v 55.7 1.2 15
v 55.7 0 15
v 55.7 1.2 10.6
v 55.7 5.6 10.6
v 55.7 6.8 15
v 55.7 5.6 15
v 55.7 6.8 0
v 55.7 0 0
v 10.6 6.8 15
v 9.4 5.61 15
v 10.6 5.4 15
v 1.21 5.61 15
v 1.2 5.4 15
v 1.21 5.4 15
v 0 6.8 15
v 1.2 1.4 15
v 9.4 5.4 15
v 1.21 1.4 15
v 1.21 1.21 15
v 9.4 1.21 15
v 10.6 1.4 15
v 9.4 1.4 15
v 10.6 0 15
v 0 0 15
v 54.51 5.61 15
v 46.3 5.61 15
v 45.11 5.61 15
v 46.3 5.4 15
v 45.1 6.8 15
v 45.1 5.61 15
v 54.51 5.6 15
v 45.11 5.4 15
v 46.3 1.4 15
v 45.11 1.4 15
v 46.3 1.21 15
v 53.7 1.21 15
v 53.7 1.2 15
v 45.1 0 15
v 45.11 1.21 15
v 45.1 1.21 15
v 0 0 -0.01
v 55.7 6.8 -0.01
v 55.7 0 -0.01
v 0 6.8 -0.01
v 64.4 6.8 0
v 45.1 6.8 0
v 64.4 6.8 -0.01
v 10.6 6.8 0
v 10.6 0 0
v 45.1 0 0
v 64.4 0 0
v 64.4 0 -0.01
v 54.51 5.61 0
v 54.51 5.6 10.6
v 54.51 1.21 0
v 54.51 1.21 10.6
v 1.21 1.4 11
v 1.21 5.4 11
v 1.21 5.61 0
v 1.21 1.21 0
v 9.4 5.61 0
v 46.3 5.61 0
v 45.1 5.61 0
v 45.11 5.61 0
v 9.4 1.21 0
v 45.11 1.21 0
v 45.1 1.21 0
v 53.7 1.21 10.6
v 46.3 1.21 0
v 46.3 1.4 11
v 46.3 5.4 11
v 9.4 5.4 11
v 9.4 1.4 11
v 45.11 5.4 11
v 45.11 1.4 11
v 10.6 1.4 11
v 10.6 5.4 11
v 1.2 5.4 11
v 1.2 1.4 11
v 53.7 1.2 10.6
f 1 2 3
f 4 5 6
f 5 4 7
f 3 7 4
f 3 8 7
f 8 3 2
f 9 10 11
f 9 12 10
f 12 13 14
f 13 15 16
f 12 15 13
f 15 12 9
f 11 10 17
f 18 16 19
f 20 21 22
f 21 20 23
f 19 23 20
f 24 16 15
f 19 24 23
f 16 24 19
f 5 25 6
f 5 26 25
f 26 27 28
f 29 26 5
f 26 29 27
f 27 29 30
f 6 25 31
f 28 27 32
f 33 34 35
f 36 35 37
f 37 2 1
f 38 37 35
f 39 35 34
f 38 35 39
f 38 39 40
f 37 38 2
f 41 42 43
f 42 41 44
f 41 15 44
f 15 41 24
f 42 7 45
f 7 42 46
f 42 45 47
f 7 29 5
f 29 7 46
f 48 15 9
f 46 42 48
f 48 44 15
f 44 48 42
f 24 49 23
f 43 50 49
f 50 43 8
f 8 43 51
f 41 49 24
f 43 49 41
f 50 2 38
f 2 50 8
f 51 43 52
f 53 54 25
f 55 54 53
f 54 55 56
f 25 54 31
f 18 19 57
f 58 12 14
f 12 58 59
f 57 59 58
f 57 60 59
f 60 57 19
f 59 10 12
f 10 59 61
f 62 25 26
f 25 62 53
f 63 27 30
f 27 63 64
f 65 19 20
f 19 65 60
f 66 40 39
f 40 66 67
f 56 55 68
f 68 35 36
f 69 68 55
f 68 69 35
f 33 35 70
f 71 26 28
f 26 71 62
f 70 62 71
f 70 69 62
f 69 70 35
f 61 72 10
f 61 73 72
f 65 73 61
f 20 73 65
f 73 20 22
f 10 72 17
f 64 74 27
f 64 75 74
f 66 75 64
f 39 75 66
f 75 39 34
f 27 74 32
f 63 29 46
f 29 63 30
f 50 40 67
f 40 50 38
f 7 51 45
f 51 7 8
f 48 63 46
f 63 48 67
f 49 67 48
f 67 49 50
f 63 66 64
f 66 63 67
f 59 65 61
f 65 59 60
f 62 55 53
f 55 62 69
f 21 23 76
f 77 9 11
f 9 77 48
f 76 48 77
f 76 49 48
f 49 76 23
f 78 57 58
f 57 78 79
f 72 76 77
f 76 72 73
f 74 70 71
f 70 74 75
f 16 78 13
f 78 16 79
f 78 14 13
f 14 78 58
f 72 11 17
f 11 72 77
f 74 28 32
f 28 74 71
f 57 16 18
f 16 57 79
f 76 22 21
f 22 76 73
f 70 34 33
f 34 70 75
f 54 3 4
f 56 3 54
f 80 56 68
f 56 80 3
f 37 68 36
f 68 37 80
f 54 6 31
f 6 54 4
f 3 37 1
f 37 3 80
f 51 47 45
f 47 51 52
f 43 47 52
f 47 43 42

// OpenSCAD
// file: ../Base/Rotation.scad
// Fischertechnik Box Foundation
// Geometry Helpers Rotation

include <PlacementOptions.scad>

// getRotatedSpace(space, rotation=NoRotation)
// Rotates the space dependent on the specified rotation

function getRotatedSpace(space, rotation=NoRotation) = [
    (rotation == Rotate90 || rotation == Rotate270) ? space.y : space.x,
    (rotation == Rotate90 || rotation == Rotate270) ? space.x : space.y
];

// Rotates the given space around the fixed left lower corner
// space = the space the children needs as width/depth list [width,depth]
// rotation = 0 Rotate0 degrees, 1 Rotate90 degrees, 2 Rotate180 degrees, 3 Rotate270 degrees (equivalent to -90)

module RotateFix(space, rotation=NoRotation) {
    dy = (rotation == Rotate0 || rotation == Rotate270) ? 0 :
        (rotation == Rotate90) ? space.x :
        space.y;
    dx = (rotation < Rotate180) ? 0 :
        (rotation == Rotate180) ? space.x :
        space.y;
    
    translate([dx, dy, 0])
        rotate([0, 0, rotations[rotation]])
            children();
}
// file: ../Base/Alignment.scad
// Fischertechnik Box Foundation
// Geometry Helpers Alignment

include <PlacementOptions.scad>

// getAlignedX(elementWidth, spaceWidth, align=AlignRight, offset=0)
// Gets the aligned X offset of an element with the given
// width in the given space.
// elementWidth = The width of the element to positon
// spaceWidth = The space where the element should be aligned
// align = 0 AlignLeft, 1 AlignCenter, 2 AlignRight
// offset = an optional offset from the aligned position. When
// aligned left or centered, then positive values are in X direction.
// When aligned right then positive values are in negative X direction.

function getAlignedX(elementWidth, spaceWidth, align=AlignRight, offset=0) =
    (align == AlignLeft) ?
        offset :
        ((align == AlignCenter) ?
        (spaceWidth - elementWidth)/2 + offset :
        spaceWidth - offset - elementWidth);

// getAlignedY(elementDepth, spaceDepth, align=AlignTop, offset=0)
// Gets the aligned Y offset of an element with the given
// depth in the given space.
// elementDepth = The depth of the element to positon
// spaceDepth = The space where the element should be aligned
// align = 0 AlignBottom, 1 AlignCenter, 2 AlignTop
// offset = an optional offset from the aligned position. When
// aligned bottom or centered, then positive values are in Y direction.
// When aligned top then positive values are in negative Y direction.

function getAlignedY(elementDepth, spaceDepth, align=AlignTop, offset=0) =
    (align == AlignBottom) ?
        offset :
        ((align == AlignCenter) ?
        (spaceDepth - elementDepth)/2 + offset :
        spaceDepth - offset - elementDepth);
// file: ../Base/PlacementOptions.scad
// Fischertechnik Box Foundation
// Placement Options

// Alignment
NoAlign = 0;
AlignLeft = 1;
AlignBottom = 2;
AlignCenter = 3;
AlignRight = 4;
AlignTop = 5;

// Element rotation degree steps
rotations = [0, -90, -180, -270];

// Rotation
NoRotation = 0;
Rotate0 = 0;
Rotate90 = 1;
Rotate180 = 2;
Rotate270 = 3;

// Docking (seen from above)
NoDock = -1;
DockLeft = 0;
DockTop = 1;
DockRight = 2;
DockCorner = 2;
DockBottom = 3;

// Web corners
LowerLeft = 0;
UpperLeft = 1;
UpperRight = 2;
LowerRight = 3;

// Web position relative to corner
LeftOfCorner = 0;
RightOfCorner = 1;
// file: ../Base/Boxes.scad
// Fischertechnik Box Foundation
// Pre-designed Boxes

use <Constants.scad>

include <PlacementOptions.scad>

box190Width = 190;
box190Depth = 130;
box130Width = 130;
box130Depth = 95;

// Values are from an original ec3 box
topBottomDifference = 1.5;
outerHeight = 40;
baseThickness = 1.8;
innerHeight = outerHeight - baseThickness;
stackExcess = 5.7;
radius = 3.5;
wallThickness = 1.5;
tolerance = 0.2;

boxWallThickness = wallThickness;
boxBaseThickness = baseThickness;
boxWebWidth = 3.0;

// getBoxWallThickness()
// Gets the wall thickness of a Fischertechnik Box
function getBoxWallThickness() = boxWallThickness;

// getBoxUsageHeight(height = 38.2)
// Gets the usable height of a Fischertechnik box
// height = Outer height of the box from the bottom to the upper edge.
function getBoxUsageHeight(height = outerHeight) = height - baseThickness - stackExcess;

// getBoxInnerHeight()
// Gets the inner height of a Fischertechnik box, including the stack excess
function getBoxInnerHeight() = innerHeight;

// getBoxBaseThickness()
// Gets the thickness of the Fischertechnik box base.
function getBoxBaseThickness() = boxBaseThickness;

// getBoxWebWidth()
// Gets the width of a box web
function getBoxWebWidth() = boxWebWidth;

// getBox190Space()
// Gets the usable inner space of a Box 190 as an x/y-list
function getBox190Space() = [
    box190Width - 2*getBoxWallThickness() - topBottomDifference, 
    box190Depth - 2*getBoxWallThickness() - topBottomDifference ];

// RoundedCornerPlate(width, depth, height, radius)
// Creates a body plate with rounded corners for a box. Used
// also to create the complete box with the hull module.
// width = Width of the plate
// depth = depth of the plate 
// height = thickness of the plate
// radius = radius of the rounded corner
module RoundedCornerPlate(width, depth, height, radius) {
    translate([radius, radius])
    hull() {
        w = width-2*radius;
        d = depth-2*radius;
        cube([w, d, height]);
        cylinder(height, r=radius, $fn=getFragments());
        translate([w, 0])
            cylinder(height, r=radius, $fn=getFragments());
        translate([w, d])
            cylinder(height, r=radius, $fn=getFragments());
        translate([0, d])
            cylinder(height, r=radius, $fn=getFragments());
    }
}

// BoxBase(width, depth)
// Creates an empty stackable Fischertechnik compatible box
// width = Outer width of the box (190, 130, ...)
// depth = Outer depth of the box (130, 95, ...)

module BoxBase(width, depth, height=outerHeight) {    
    thinPlate = 0.01;

    innerHeight = height - baseThickness;    
    
    module Body(tolerance=tolerance) {
        hull() {
            // Bottom with tolerance to fit into the original boxes when stacked
            translate([-wallThickness+tolerance, -wallThickness+tolerance, -baseThickness])
                RoundedCornerPlate(width-topBottomDifference-2*tolerance, depth-topBottomDifference-2*tolerance, thinPlate, radius);
            
            // Top
            translate([-wallThickness-topBottomDifference/2, -wallThickness-topBottomDifference/2, innerHeight-thinPlate])
                RoundedCornerPlate(width, depth, thinPlate, radius);
         }
    }

    module Cutoff() {
        hull() {
            coWidth = width - 2*wallThickness;
            coDepth = depth - 2*wallThickness;
            
            // Bottom
            RoundedCornerPlate(coWidth-topBottomDifference, coDepth-topBottomDifference, thinPlate, radius);

            // Top
            translate([-topBottomDifference/2, -topBottomDifference/2, innerHeight+thinPlate]) 
                RoundedCornerPlate(coWidth, coDepth, thinPlate, radius);
        }
    }
    
    difference() {        
        Body();
        Cutoff();
        stackOffset = innerHeight - stackExcess;
        translate([0, 0, stackOffset + baseThickness])
            Body(tolerance=0);
    }
}

// Creates the Fischertechnik empty box 130x190 mm and places it at position 0,0
// 190x130 are the outer sizes, the inner space is slightly smaller. Use getBox190Space() to get the inner sizes.
// The box is positioned that the usable inner space is at the 0,0,0 position.

module Box190() {
    BoxBase(box190Width, box190Depth);
}

// Gets the usable inner space of a Box 130 as an x/y-list
function getBox130Space() = [
    box130Width - 2*getBoxWallThickness() - topBottomDifference, 
    box130Depth - 2*getBoxWallThickness() - topBottomDifference ];

// Creates the Fischertechnik empty box 95x130 mm and places it at position 0,0
// 190x130 are the outer sizes, the inner space is slightly smaller. Use getBox190Space() to get the inner sizes.
// The box is positioned that the usable inner space is at the 0,0,0 position.

module Box130() {
    BoxBase(box130Width, box130Depth);
}

// Creates a web at the specified box walls
// corner 0 = LowerLeft, 1 = UpperLeft, 2 = UpperRight, 3 = LowerRight
// side 0 = LeftOfCorner, 1 = RightOfCorner
// distance = Distance in mm from the corner
// boxSpace = inner width and depth of the box (default: Box 190)
// webWidth = length of the web (default is 3 mms)
// webThickness = thickness of the web (default is 1 mm)
// height = Height of the web (standard is getBoxUsageHeight())
// sink = How much of the web is sunk into the wall

module BoxWeb(
    corner, 
    side, 
    distance, 
    boxSpace=getBox190Space(), 
    webWidth=getBoxWebWidth(), 
    webThickness=1.0, 
    height=getBoxUsageHeight(),
    sink = getBoxWallThickness()/2) {
    width = (corner % 2 == 0) ? 
            (side == LeftOfCorner ? webWidth : webThickness) :
            (side == LeftOfCorner ? webThickness : webWidth);

    depth = (corner % 2 == 0) ? 
            (side == RightOfCorner ? webWidth : webThickness) :
            (side == RightOfCorner ? webThickness : webWidth);
    
    xDiff = corner == LowerLeft ? 
                (side == LeftOfCorner ? -sink : distance) :
            (corner == UpperLeft ?                
                (side == LeftOfCorner ? distance : -sink) :
            (corner == UpperRight ?
                (side == LeftOfCorner ? boxSpace.x-webWidth+sink : boxSpace.x-distance-webThickness) :
                (side == LeftOfCorner ? boxSpace.x-distance-webThickness: boxSpace.x-webWidth+sink)));

    yDiff = corner == LowerLeft ? 
                (side == RightOfCorner ? -sink : distance) :
            (corner == UpperLeft ?
                (side == RightOfCorner ? boxSpace.y-distance-webThickness : boxSpace.y-webWidth+sink) :
            (corner == UpperRight ?
                (side == RightOfCorner ? boxSpace.y-webWidth+sink : boxSpace.y-distance-webThickness) :
                (side == RightOfCorner ? distance : -sink)));
    
    translate([xDiff, yDiff, -getExcess()])
        cube([width, depth, height + 2*getExcess()]);
}
// file: ../Base/Placement.scad
// Fischertechnik Box Foundation
// Geometry Helpers Placement

use <Constants.scad>
use <Alignment.scad>
use <Rotation.scad>
use <Boxes.scad>

include <PlacementOptions.scad>

// Place(x=0, y=0, elementSpace=[0,0], alignX=AlignLeft, alignY=AlignBottom, rotation=Rotate0, boxSpace=getBox190Space())
// Places the child at the specified position
// y = Y-Position. This is a relative position when an X aligment is specified.
// x = X-Position. This is a relative position when an Y aligment is specified.
// elementSpace = space of the element to be placed [x,y]
// alignX = -1=NoAlign, 0 AlignLeft, 1 AlignCenter, 3 AlignRight (elementSpace and boxSpace required!)
// alignY = -1=NoAlign, 2 AlignBottom, 1 AlignCenter, 4 AlignTop (elementSpace and boxSpace required!)
// rotation = 0 Rotate0 0 degrees, 1 Rotate90 90 degrees, 
// 2 Rotate180 180 degrees, 3 Rotate270 270 degrees (equivalent to -90)
// boxSpace = Inner space of the box where the placement occurs [x,y] - default is Box 190x130 inner space

module Place(x=0, y=0, elementSpace=[0,0], 
  alignX=AlignLeft, alignY=AlignBottom, 
  rotation=NoRotation, boxSpace=getBox190Space()) {

    module Position(x, y, space, rotation=Rotate0) {
        translate([x, y, 0])
            RotateFix(space, rotation)
                children();
    }

    space = getRotatedSpace(elementSpace, rotation);
    alignedX = getAlignedX(space.x, boxSpace.x, alignX, x);
    alignedY = getAlignedY(space.y, boxSpace.y, alignY, y);
    Position(alignedX, alignedY, elementSpace, rotation)
        children();
}

// Center(space=getBox130Space(), elementSpace=[0,0])
// space = Space where the children is centered. For cylinder use centered=true and no elementSpace.
// elementSpace = space of the element to be centered [x,y]

module Center(space=getBox190Space(), elementSpace=[0,0]) {
    Place(elementSpace=elementSpace, boxSpace=space, alignX=AlignCenter, alignY=AlignCenter)
        children();
}

// CenterHorizontal(width=0, y=0, offset=0, space=getBox130Space())
// width = Width of the element to be placed.
// y = Y position of the element
// offset = Offset from the center position (negative will be left of the center)
// space = Space where the element is placed

module CenterHorizontal(width=0, y=0, offset=0, space=getBox190Space()) {
    Place(x=offset, y=y, elementSpace=[width, 0], boxSpace=space, alignX=AlignCenter)
        children(0);
}

// CenterVertical(depth=0, x=0, offset=0, space=getBox130Space())
// depth = Depth of the element to be placed.
// x = X position of the element
// offset = Offset from the center position (negative will be down of the center)
// space = Space where the element is placed

module CenterVertical(depth=0, x=0, offset=0, space=getBox190Space()) {
    Place(x=x, y=offset, elementSpace=[0, depth], boxSpace=space, alignY=AlignCenter)
        children(0);
}

// getIsVertical(align)
// True if the specified alignment needs a vertical orientation for a divider (AlignRight, AlignLeft)

function getIsVertical(align) = (align == AlignRight || align == AlignLeft);

// getIsHorizontal(align)
// True if the specified alignment needs a horizontal orientation for a divider (AlignTop, AlignBottom)

function getIsHorizontal(align) = (align == AlignTop || align == AlignBottom);
// file: ../Base/Constants.scad
// Fischertechnik Box Foundation
// Constants

// Constant values necessary for multiple elements

// Base constants
dividerThickness = 1.2;
excess = 0.01;
fragments = 90;
tolerance = 0.8;

// Gets the thickness of a divider 
function getDividerThickness() = dividerThickness;

// Gets the excess that is used to merge walls into each other
function getExcess() = excess;

// Gets amount of fragments of a cylinder
function getFragments() = fragments;

// Gets the inner tolerance of a frame to each side
function getTolerance() = tolerance;


// Fischertechnik specific constants
axisDiameter = 4;
axisBottomDiameter = axisDiameter + 1;
axisTolerance = 0.2;

// Gets axis diameter of Fischertechnik axis
function getAxisDiameter() = axisDiameter;

// Gets axis diameter tolerance (subtracted for element axis)
function getAxisTolerance() = axisTolerance;

// Gets the axis diameter for standing axis
function getStandAxisDiameter() = getAxisDiameter() - getAxisTolerance();

// Gets axis bottom diameter for thicker part at the bottom
function getAxisBottomDiameter() = axisBottomDiameter;

pinHeight = 2.5;

// gets the height of a connecting pin
function getPinHeight() = pinHeight;

standardEdgeDistance = 2.5;
standardWebDistance = 11.5;
standardCornerLength = 15;

// gets the standard distance to the wall of the box for dockable frames with webs
function getStandardEdgeDistance() = standardEdgeDistance;

// gets the standard distance of each web to the corner of the dockable frame
function getStandardWebDistance() = standardWebDistance;

// gets the standard length of the corner walls of a dockable frame
function getStandardCornerLength() = standardCornerLength;

tubeWallFactor = 0.8;

// gets the wall thickness of a tube.
function getTubeWallThickness() = tubeWallFactor * getDividerThickness();

smallPartsFrameHeight = 20;

// gets the frame height for docked small parts boxes.
function getSmallPartsFrameHeight() = smallPartsFrameHeight;

hubRingDiameter = 19.5;
hubRingLevelDiameter = 21;

// gets the diameter of a tube matching the inner ring of a wheel
function getHubRingDiameter() = hubRingDiameter;

// gets the diameter of a hub tube with a thicker diameter
function getHubRingLevelDiameter() = hubRingLevelDiameter;
// main file
// Fischertechnik Box Library
// Frame for single 60 mm Axis in 55mm distance and one open (mot1)
// 31032

use <../Base/Constants.scad>
use <../ModelBase/Simple.scad>
use <../ModelBase/Complex.scad>

/* [Hidden] */
length = 52.5;

// getFrameAxis60OpenSpace()
// Gets the width (.x) and depth (.y) of the axis frame.

function getFrameAxis60OpenSpace() = [
    getFrameAxisSpace(length).x + 7.5 + getDividerThickness(),
    getFrameAxisSpace(length).y,
    getFrameAxisSpace(length).z];

// FrameAxis60Open()
// Axis holder for a single 60 mm axis.

module FrameAxis60Open() {
    Space(getFrameAxis60OpenSpace());
    
    difference() {
        FrameAxis(length);
        translate([length+getDividerThickness(), getDividerThickness(), getFrameAxisHeight()-getFrameAxisDepth()])
            cube([getDividerThickness()*2, getFrameAxisDepth(), getFrameAxisDepth() + getExcess()]);
    }
}

// Test
color("lightgray")
FrameAxis60Open();
